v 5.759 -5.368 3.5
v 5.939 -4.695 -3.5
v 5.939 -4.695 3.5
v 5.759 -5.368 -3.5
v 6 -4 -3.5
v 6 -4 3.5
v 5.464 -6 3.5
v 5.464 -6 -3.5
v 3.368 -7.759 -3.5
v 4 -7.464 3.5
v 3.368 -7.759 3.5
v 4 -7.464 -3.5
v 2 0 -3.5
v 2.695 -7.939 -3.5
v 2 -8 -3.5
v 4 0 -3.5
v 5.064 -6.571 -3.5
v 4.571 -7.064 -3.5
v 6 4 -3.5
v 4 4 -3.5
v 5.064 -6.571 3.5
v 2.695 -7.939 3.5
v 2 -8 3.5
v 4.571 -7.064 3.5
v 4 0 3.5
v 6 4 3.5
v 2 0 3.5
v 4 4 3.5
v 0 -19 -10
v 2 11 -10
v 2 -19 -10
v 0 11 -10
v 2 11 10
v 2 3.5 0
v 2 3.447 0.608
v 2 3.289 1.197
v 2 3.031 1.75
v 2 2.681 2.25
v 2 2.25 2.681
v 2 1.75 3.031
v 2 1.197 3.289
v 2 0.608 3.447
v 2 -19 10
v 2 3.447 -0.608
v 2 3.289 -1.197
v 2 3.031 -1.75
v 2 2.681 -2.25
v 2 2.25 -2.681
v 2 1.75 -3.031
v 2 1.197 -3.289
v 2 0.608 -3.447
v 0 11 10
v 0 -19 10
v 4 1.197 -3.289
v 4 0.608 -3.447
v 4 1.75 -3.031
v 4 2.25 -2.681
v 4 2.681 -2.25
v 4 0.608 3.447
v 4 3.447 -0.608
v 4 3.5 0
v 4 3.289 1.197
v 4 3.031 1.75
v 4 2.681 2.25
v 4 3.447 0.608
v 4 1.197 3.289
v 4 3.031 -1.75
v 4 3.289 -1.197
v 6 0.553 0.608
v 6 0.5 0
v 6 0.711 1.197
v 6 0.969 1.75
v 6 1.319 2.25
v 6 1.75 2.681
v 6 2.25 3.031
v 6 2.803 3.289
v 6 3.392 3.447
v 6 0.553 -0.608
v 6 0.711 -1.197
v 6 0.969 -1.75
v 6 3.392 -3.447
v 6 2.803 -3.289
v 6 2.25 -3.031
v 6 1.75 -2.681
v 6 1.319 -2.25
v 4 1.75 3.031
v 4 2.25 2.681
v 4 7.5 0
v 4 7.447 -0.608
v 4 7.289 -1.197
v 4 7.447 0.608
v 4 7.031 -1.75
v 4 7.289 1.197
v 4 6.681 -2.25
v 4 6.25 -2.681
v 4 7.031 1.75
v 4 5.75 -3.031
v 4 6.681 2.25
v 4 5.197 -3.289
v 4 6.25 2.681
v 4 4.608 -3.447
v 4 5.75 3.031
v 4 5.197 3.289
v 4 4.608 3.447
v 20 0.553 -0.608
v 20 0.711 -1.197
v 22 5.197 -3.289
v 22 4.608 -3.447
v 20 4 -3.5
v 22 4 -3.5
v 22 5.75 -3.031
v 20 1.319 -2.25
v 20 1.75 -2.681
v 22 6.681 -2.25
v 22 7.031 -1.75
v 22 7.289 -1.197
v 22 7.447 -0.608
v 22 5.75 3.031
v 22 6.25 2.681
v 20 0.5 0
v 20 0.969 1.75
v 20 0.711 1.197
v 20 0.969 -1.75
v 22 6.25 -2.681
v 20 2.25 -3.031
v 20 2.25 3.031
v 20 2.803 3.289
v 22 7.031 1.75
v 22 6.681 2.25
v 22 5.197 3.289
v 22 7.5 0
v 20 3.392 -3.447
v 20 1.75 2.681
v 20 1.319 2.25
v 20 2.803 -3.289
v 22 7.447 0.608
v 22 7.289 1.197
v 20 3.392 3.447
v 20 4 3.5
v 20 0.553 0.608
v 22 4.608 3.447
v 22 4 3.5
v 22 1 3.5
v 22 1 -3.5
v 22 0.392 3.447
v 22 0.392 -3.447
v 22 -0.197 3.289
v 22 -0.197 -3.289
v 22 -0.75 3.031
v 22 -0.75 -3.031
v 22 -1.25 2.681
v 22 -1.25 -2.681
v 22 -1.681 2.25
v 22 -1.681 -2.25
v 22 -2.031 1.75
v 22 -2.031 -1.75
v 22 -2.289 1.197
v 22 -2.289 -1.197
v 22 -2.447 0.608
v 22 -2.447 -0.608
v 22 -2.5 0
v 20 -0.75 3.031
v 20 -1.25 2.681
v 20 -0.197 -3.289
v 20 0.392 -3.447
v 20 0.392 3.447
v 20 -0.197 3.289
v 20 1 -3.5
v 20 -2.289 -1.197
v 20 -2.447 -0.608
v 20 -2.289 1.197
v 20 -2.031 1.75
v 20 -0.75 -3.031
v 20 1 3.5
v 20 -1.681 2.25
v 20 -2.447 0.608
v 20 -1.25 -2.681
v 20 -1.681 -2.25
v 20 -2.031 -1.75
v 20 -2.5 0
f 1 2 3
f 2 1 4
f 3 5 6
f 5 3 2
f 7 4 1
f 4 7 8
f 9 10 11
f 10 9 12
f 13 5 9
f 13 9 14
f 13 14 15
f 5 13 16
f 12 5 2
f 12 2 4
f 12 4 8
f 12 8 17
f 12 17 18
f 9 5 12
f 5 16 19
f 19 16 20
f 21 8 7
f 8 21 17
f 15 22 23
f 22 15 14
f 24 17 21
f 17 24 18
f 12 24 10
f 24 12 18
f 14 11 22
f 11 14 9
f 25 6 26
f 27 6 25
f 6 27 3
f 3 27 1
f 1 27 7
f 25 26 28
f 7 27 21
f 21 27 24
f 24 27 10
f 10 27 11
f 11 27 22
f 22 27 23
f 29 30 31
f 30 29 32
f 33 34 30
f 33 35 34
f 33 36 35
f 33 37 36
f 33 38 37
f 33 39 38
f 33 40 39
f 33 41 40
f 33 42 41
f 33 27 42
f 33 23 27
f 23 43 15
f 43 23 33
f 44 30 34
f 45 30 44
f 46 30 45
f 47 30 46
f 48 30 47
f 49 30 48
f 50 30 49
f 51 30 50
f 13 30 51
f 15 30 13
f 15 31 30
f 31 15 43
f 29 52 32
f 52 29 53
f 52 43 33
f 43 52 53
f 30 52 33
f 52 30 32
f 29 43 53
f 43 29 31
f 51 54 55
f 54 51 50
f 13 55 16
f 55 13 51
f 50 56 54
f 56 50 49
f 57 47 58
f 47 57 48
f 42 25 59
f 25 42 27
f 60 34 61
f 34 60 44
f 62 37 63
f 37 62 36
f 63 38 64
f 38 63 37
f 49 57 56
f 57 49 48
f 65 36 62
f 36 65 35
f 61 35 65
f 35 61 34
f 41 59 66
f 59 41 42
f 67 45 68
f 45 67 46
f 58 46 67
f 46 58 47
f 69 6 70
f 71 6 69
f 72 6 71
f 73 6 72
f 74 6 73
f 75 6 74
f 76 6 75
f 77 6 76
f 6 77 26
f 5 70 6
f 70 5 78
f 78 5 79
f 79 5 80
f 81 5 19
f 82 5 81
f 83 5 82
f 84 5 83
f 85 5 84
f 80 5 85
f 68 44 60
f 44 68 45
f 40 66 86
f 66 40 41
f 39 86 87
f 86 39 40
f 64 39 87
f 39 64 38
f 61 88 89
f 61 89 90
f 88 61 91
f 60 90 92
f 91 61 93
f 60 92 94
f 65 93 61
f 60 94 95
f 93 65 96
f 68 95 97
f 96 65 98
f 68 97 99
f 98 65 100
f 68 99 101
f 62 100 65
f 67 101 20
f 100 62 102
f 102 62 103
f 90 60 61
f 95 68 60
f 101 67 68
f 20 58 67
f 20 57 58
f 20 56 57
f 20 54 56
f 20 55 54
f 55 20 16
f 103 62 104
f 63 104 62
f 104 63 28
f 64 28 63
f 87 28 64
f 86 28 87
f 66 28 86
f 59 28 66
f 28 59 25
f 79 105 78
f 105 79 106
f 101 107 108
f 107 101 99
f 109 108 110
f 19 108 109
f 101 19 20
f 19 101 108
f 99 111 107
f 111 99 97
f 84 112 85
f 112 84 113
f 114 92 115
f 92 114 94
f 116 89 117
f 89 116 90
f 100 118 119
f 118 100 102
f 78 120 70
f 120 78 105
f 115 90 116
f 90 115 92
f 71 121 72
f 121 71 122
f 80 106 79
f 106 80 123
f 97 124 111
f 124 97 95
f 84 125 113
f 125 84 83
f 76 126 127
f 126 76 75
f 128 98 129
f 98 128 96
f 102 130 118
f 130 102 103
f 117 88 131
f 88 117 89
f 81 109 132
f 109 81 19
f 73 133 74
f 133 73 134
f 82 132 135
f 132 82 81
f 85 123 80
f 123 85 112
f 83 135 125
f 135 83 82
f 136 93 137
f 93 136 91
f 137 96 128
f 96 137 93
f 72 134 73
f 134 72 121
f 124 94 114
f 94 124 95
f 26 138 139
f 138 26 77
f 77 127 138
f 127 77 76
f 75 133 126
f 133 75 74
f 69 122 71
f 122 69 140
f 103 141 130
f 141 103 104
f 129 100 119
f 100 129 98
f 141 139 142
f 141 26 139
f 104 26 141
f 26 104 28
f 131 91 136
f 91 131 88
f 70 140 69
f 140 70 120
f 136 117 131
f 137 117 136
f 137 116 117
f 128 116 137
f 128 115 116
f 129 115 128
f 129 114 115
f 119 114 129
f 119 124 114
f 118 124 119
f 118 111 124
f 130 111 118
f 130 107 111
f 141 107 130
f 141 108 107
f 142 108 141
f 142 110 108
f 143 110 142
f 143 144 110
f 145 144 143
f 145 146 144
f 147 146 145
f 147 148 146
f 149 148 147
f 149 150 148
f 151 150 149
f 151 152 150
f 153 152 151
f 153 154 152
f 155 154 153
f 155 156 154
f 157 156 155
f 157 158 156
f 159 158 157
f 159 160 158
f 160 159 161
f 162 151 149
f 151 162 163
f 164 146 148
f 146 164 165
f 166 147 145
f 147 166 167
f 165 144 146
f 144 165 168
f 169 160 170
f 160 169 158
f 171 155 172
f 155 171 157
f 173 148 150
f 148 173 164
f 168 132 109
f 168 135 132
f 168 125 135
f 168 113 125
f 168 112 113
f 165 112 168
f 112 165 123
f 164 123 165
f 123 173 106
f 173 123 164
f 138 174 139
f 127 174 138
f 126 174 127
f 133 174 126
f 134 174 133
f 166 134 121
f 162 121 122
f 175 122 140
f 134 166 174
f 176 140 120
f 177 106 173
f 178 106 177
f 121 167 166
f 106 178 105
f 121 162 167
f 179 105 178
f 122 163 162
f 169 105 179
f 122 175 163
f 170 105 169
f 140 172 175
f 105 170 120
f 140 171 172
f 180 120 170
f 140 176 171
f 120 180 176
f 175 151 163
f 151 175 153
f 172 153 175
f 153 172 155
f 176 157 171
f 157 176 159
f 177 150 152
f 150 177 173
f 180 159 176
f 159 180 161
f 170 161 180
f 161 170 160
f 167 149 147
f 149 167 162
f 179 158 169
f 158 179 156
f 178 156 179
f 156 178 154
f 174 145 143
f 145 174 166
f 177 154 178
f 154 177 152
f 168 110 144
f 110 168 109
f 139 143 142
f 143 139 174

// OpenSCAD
// hook for angle rack
// ver.140615 by junnno

// the width of the back plate
base_width = 20;
// the height of the back plate
base_height = 30;
// the thickness of the back plate
base_thickness = 2;

// the thickness of the groove hooking on angle body
hook_groove_gap = 2;
// the depth of the groove hooking on angle body
hook_groove_depth = 4;
// the theckness of the part connecting the hook root and the arm
hook_transition_length = 2;
// the height of the root block to restrict rotation
hook_block_height = 4;

// the diameter of the arm
arm_diameter = 7;
// the length of the arm from the edge of the groove to the most tip
arm_length = 18;
// the height of the bump at the arm tip
arm_tip_height = 3;
// the length of the bump at the arm tip
arm_tip_length = 2;

// the horizontal offset of the arm root from the center of the base plate
arm_offset_horizontal = 0;
// the vertical offset of the arm root from the center of the base plate
arm_offset_vertical = 4;

$fn = 36;

module quater_cylinder(h=1,r=1,intrusion=0)
{
	intersection(){
		cylinder(h=h, r=r);
		translate([-intrusion,-intrusion,-1]) cube([r+1+intrusion,r+1+intrusion,h+2],center=false);
	}
}
//#quater_cylinder(10,10);

module hook01()
{
	// the base plate
	translate([-arm_offset_horizontal,-arm_offset_vertical,base_thickness/2])
		cube([base_width, base_height, base_thickness], center = true);

	// the hook area of the arm
	translate([0,0,base_thickness])
		cylinder(h = hook_groove_gap + hook_transition_length, r = arm_diameter/2);
	translate([0,hook_groove_depth/2,base_thickness+hook_groove_gap+hook_transition_length/2])
		cube([arm_diameter,abs(hook_groove_depth),hook_transition_length], center = true);
	
	// the hook block
	translate([0,-hook_block_height/2, base_thickness+(hook_groove_gap+hook_transition_length)/2])
		cube([arm_diameter,hook_block_height,hook_groove_gap+hook_transition_length], center = true);
	translate([-arm_diameter/2, -hook_block_height, base_thickness])
		rotate([-90,-90,-90])
			quater_cylinder(h=arm_diameter,r=hook_groove_gap+hook_transition_length,intrusion=0.1);
	
	// the body of the arm
	translate([0,hook_groove_depth,base_thickness+hook_groove_gap])
		cylinder(h = arm_length, r = arm_diameter/2);

	// the tip of the arm
	translate([0,hook_groove_depth-arm_tip_height,base_thickness+hook_groove_gap+arm_length-arm_tip_length])
		cylinder(h = arm_tip_length, r = arm_diameter/2);
	translate([0,hook_groove_depth-arm_tip_height/2,base_thickness+hook_groove_gap+arm_length-arm_tip_length/2])
		cube([arm_diameter,abs(arm_tip_height),arm_tip_length], center = true);
		
}

rotate([0,90,0])
	hook01();
